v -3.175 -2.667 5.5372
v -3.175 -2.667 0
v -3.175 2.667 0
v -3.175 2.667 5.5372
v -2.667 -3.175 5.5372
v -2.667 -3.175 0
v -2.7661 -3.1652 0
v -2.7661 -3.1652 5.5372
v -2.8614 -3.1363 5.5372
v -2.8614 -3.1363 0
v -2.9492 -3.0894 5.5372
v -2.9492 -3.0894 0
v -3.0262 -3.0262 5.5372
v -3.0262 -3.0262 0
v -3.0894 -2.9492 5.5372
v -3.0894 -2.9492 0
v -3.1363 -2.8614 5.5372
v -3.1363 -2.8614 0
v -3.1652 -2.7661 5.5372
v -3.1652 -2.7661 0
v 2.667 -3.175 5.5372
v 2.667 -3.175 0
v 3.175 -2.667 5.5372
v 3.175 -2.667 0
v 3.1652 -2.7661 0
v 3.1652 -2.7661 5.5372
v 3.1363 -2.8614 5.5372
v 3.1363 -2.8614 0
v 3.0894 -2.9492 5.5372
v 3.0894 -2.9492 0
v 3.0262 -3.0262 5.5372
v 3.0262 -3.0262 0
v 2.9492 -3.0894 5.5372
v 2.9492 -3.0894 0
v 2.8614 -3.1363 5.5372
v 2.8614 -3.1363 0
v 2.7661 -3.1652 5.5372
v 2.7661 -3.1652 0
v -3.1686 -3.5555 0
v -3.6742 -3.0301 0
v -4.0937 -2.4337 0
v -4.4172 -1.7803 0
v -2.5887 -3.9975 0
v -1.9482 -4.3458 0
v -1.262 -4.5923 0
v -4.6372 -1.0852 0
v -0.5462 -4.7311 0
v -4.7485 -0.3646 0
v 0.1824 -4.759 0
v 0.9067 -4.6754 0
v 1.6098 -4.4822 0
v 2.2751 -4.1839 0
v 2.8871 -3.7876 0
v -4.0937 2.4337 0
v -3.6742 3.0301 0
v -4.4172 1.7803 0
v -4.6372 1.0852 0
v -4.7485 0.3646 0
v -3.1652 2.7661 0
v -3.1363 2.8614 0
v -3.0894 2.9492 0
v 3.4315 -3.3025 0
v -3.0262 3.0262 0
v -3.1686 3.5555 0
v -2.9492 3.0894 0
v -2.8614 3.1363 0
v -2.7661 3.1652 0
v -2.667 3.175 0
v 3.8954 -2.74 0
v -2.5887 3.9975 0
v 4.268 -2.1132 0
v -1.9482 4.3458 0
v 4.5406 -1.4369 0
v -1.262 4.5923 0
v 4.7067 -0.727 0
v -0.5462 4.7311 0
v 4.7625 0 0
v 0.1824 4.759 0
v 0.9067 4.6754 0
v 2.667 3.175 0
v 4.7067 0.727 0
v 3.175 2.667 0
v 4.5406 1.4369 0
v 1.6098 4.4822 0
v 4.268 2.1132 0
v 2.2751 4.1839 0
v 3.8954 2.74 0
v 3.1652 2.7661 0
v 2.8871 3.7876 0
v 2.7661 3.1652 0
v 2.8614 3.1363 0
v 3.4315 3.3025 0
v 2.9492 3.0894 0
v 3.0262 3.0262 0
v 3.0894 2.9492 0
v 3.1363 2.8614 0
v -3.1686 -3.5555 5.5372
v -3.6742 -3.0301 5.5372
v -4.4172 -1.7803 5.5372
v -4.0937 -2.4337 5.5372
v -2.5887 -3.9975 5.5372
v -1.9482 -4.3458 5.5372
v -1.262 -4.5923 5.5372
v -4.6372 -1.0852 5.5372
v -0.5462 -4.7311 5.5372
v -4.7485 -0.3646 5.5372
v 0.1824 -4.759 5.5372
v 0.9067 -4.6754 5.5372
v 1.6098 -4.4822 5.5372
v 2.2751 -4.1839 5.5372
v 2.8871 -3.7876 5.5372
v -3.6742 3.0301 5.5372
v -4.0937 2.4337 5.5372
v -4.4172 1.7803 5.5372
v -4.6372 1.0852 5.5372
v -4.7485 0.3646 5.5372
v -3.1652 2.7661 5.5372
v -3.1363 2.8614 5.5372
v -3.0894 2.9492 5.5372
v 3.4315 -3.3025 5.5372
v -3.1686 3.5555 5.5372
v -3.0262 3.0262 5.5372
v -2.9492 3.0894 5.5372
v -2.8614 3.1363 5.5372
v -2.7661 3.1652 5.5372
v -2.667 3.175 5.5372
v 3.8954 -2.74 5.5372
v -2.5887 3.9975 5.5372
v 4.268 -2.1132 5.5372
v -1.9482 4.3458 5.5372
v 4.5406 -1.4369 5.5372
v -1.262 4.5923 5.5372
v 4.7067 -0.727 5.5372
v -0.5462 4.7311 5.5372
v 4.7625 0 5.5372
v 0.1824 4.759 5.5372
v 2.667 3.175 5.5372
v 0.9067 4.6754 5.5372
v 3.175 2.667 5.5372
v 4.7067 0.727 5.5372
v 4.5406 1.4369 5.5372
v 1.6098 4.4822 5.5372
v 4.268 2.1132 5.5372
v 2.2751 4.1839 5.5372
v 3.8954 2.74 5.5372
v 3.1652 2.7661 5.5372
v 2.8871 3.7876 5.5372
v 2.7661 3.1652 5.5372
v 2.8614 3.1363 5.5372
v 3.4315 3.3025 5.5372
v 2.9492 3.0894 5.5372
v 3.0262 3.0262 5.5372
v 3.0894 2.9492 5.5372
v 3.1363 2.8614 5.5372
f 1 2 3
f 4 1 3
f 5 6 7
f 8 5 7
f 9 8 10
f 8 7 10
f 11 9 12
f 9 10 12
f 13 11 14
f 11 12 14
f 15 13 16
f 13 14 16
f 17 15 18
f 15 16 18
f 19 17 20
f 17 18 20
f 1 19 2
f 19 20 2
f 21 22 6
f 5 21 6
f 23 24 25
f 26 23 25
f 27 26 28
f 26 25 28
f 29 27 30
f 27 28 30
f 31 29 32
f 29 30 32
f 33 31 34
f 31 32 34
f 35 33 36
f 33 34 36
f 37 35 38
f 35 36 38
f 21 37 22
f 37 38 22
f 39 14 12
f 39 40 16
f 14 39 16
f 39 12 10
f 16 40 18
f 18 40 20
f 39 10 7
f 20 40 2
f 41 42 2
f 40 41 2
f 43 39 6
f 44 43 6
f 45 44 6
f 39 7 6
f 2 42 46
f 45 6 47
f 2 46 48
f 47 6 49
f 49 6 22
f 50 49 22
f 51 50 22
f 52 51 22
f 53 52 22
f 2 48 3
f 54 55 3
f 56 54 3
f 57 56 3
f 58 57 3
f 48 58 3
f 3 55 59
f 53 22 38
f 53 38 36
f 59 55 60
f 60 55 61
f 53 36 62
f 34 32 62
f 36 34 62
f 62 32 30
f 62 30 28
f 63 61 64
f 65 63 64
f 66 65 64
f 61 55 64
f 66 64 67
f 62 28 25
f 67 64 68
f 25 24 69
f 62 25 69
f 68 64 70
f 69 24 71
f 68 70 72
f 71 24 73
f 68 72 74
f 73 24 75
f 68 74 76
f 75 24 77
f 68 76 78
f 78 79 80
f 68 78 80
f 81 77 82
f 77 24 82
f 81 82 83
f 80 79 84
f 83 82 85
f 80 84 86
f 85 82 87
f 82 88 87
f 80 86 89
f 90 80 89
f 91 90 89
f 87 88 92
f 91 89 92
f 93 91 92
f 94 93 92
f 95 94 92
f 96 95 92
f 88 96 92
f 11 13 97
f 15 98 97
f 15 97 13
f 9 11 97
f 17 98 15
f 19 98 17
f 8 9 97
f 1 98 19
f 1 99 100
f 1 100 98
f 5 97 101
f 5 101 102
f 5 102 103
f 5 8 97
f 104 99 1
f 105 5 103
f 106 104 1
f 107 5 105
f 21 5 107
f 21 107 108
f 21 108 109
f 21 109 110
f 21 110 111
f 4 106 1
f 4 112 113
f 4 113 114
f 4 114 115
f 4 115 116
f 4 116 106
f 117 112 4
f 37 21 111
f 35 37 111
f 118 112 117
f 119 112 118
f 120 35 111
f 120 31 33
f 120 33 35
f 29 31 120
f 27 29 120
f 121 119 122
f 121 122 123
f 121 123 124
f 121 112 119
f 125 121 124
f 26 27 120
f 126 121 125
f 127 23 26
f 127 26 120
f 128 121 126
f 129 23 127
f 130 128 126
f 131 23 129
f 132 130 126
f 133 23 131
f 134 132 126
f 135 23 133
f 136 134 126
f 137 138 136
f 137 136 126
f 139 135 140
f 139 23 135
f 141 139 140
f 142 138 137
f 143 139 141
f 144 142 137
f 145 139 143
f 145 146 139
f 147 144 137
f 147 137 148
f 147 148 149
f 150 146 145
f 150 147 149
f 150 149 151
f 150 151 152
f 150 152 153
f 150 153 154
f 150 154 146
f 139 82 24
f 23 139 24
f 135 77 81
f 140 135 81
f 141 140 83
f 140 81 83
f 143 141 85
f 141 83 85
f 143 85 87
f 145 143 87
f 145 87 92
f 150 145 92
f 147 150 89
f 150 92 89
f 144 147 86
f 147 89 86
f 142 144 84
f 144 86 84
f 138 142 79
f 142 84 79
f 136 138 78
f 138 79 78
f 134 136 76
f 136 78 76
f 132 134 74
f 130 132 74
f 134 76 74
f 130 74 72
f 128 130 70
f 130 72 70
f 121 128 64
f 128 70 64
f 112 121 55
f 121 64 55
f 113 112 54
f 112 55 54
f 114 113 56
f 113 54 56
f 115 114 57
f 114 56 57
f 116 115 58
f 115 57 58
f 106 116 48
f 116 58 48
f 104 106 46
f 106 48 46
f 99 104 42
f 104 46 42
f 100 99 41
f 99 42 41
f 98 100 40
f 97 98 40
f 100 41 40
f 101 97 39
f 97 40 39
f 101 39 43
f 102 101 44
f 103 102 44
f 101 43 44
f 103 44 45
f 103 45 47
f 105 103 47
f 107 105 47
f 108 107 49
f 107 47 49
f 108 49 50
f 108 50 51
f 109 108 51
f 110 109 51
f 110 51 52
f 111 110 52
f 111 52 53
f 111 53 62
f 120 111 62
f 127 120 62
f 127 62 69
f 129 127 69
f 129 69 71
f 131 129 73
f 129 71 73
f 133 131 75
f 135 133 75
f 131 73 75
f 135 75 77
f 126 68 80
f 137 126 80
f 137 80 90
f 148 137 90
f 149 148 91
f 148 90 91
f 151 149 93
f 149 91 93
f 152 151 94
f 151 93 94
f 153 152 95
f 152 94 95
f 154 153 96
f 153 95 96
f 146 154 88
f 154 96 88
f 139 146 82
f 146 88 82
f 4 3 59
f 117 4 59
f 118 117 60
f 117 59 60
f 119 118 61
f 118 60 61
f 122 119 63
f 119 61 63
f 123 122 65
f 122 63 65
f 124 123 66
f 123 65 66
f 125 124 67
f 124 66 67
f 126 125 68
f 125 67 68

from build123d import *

# Parameters (mm, degrees)
SKETCH1_R           = 4.7625
BOSS_EXTRUDE1_DEPTH = 5.5372


with BuildPart() as part:
    # Sketch1 → Boss-Extrude1 (new body)
    with BuildSketch(Plane.XY):
        Circle(SKETCH1_R)
        with BuildLine():
            Line((-2.667, 3.175), (2.667, 3.175))
            ThreePointArc((2.667, 3.175), (3.026210245, 3.026210245), (3.175, 2.667))
            Line((3.175, 2.667), (3.175, -2.667))
            ThreePointArc((3.175, -2.667), (3.026210245, -3.026210245), (2.667, -3.175))
            Line((2.667, -3.175), (-2.667, -3.175))
            ThreePointArc((-2.667, -3.175), (-3.026210245, -3.026210245), (-3.175, -2.667))
            Line((-3.175, -2.667), (-3.175, 2.667))
            ThreePointArc((-3.175, 2.667), (-3.026210245, 3.026210245), (-2.667, 3.175))
        make_face(mode=Mode.SUBTRACT)
    extrude(amount=BOSS_EXTRUDE1_DEPTH)


solid = part.part
